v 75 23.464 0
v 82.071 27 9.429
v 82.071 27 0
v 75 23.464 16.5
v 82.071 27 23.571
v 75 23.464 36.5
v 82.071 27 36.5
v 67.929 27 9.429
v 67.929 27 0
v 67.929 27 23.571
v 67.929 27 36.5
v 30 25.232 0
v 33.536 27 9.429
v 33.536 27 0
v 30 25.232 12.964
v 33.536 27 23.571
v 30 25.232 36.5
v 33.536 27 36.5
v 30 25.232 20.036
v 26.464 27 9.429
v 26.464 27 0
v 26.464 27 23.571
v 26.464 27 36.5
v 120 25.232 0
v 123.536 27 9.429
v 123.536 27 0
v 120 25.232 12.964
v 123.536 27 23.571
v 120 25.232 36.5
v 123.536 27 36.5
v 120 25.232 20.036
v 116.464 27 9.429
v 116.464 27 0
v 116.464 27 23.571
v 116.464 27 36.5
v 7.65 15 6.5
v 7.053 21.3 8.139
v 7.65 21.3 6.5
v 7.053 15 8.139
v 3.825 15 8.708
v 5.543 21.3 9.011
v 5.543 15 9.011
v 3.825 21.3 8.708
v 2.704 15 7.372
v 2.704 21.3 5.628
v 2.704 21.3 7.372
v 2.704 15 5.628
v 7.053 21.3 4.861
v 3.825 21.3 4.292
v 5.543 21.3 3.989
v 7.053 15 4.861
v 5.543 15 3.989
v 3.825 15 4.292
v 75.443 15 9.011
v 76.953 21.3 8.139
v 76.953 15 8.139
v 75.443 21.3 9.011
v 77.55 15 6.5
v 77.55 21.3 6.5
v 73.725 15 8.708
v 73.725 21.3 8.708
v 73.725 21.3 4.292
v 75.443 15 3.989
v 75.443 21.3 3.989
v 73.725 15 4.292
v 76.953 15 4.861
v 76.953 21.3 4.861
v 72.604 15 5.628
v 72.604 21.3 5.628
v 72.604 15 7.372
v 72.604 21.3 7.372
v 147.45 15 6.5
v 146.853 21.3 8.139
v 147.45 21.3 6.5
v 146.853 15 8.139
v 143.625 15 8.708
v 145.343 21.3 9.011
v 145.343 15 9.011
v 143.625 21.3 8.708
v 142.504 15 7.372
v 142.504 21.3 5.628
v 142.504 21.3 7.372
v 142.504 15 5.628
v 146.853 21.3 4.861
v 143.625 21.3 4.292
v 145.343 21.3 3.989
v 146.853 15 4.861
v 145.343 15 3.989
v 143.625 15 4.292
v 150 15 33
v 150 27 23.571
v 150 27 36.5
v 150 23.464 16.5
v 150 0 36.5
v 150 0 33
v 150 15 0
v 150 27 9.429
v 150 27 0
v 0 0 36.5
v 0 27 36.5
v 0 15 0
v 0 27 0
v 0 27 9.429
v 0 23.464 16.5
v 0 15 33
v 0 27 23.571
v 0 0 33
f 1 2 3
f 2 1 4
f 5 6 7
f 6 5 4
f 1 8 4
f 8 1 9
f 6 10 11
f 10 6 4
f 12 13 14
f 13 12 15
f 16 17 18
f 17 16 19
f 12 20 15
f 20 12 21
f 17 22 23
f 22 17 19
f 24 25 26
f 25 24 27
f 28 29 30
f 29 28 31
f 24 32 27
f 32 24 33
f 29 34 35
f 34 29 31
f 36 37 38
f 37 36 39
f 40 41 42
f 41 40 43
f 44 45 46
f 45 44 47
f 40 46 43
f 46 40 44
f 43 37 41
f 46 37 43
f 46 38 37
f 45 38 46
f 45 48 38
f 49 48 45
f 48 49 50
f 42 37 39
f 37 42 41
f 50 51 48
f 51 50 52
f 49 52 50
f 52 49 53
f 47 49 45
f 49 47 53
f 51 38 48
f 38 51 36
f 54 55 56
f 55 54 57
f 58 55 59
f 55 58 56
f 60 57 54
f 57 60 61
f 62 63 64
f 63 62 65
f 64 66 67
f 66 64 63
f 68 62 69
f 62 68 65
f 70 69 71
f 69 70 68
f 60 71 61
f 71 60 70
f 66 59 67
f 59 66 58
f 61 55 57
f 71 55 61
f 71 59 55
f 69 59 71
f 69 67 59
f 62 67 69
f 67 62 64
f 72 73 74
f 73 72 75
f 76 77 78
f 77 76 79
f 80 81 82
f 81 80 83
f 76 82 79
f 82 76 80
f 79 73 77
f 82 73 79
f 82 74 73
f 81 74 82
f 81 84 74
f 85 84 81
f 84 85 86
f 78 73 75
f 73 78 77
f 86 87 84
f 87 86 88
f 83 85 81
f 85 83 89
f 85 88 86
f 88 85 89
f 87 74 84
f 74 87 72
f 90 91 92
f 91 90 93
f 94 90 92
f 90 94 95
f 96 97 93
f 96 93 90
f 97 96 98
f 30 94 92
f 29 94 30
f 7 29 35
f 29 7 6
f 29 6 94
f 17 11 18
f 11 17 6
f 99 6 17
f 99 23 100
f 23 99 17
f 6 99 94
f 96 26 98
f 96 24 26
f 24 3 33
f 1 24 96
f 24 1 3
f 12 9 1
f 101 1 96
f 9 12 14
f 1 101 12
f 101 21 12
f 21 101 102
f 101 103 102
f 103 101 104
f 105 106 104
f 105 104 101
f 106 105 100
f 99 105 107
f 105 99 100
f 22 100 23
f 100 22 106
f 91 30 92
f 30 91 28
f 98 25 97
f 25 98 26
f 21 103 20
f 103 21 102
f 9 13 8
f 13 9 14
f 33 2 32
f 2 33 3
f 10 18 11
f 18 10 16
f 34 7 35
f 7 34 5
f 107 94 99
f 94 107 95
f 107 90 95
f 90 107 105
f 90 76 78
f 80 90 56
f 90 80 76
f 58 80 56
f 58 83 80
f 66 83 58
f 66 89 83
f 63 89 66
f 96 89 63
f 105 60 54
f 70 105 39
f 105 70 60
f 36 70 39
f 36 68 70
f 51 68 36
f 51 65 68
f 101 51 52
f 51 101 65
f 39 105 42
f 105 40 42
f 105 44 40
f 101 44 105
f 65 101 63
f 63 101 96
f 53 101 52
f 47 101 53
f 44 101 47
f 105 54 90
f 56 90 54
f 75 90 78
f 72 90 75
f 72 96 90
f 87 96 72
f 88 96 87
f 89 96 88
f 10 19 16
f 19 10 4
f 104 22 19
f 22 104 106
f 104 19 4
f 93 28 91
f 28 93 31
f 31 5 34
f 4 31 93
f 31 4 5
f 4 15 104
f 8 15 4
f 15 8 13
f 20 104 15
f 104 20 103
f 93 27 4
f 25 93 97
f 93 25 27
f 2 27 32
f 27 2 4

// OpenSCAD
/*[ Jaws ]*/
// Vice jaw width
jawWidth = 150;
// Vice jaw height
jawHeight = 33;
// Angle one groove?
angledGroove = "no"; // [yes,no]
// Jaw top?
showTop = "yes"; // [yes, no]
// Jaw sides?
showSides = "no"; // [yes, no]

/*[ Magnets ]*/
magnetDiameter = 5.1;
magnetHeight = 6.3;
numMagnets = 3;
magnetOffset = -10;

/*[Hidden]*/
magnetRadius = magnetDiameter/2;
jawThickness = 12.0;
jawSideThickness = showSides=="yes" ? 3.5 : 0;
jawTopWidth = 15;
jawTopThickness = showTop=="yes" ? 3.5 : 0;

maxMagnets = min(numMagnets, floor((jawWidth - magnetDiameter)/magnetDiameter));

buffer = 0.2;

function steps( start, no_steps, end) = (no_steps==1) ? [(end-start)/2:1:(end-start)/2] : [start:(end-start)/(no_steps-1):end];

module rotate_about(rotation, pt) {
  translate(pt)
    rotate(rotation)
      translate(-pt)
        children();   
}

difference() {
  cube([jawWidth + jawSideThickness * 2, jawThickness + jawTopWidth, jawHeight + jawTopThickness]);
  
  // jaw pocket
  phBuffer = showSides == "yes" ? 0 : buffer;
  pvBuffer = showTop == "yes" ? 0 : buffer;

  translate([jawSideThickness - phBuffer, -buffer , -buffer]) {
    cube([jawWidth + phBuffer * 2, jawTopWidth + buffer, jawHeight + buffer + pvBuffer]);
  }
    
  // horizontal valley
  translate([-buffer, jawThickness + jawTopWidth, jawHeight/2]) {
    valley(jawWidth + jawSideThickness * 2, 10);
  }
  
  // vertical valleys
  rotate([0, 90, 0]) {
    translate([-(buffer + jawHeight + jawTopThickness), jawThickness + jawTopWidth, (jawWidth + jawSideThickness * 2)/2]) {
      valley(jawHeight + jawTopThickness, 10);
    }
    
    translate([-(buffer + jawHeight + jawTopThickness), jawThickness + jawTopWidth, (jawWidth + jawSideThickness * 2)/5]) {
      valley(jawHeight + jawTopThickness, 5);
    }
    
    translate([-(buffer + jawHeight + jawTopThickness), jawThickness + jawTopWidth, (jawWidth + jawSideThickness * 2)/5 * 4]) {
      if(angledGroove=="yes") {
        translate([-3.3, 0, 3.3 + (jawHeight + jawTopThickness * 2)/2]) {
          rotate([0, 45, 0]) {
            valley((jawHeight + jawTopThickness)*3, 5);
          }
        }
      } else {
        valley(jawHeight + jawTopThickness, 5);
      }
    }
  }

  // magnet holes
  translate([jawSideThickness, jawTopWidth + magnetHeight, (jawHeight/2)+magnetOffset]) {
    for(i=steps(magnetDiameter, maxMagnets, jawWidth - magnetDiameter)) {
      rotate([90, 0, 0]) {
        translate([i, 0, 0]) {
          cylinder(r=magnetRadius, h=magnetHeight + buffer);
        }
      }
    }
  }
}

module valley(width, depth = 10) {
  translate([0, 0, -sqrt(depth*depth + depth*depth)/2]) {
    scale([1, 0.5, 1]) {
      rotate([45, 0, 0]) {
        cube([width + buffer *2, depth, depth]);
      }
    }
  }
}
